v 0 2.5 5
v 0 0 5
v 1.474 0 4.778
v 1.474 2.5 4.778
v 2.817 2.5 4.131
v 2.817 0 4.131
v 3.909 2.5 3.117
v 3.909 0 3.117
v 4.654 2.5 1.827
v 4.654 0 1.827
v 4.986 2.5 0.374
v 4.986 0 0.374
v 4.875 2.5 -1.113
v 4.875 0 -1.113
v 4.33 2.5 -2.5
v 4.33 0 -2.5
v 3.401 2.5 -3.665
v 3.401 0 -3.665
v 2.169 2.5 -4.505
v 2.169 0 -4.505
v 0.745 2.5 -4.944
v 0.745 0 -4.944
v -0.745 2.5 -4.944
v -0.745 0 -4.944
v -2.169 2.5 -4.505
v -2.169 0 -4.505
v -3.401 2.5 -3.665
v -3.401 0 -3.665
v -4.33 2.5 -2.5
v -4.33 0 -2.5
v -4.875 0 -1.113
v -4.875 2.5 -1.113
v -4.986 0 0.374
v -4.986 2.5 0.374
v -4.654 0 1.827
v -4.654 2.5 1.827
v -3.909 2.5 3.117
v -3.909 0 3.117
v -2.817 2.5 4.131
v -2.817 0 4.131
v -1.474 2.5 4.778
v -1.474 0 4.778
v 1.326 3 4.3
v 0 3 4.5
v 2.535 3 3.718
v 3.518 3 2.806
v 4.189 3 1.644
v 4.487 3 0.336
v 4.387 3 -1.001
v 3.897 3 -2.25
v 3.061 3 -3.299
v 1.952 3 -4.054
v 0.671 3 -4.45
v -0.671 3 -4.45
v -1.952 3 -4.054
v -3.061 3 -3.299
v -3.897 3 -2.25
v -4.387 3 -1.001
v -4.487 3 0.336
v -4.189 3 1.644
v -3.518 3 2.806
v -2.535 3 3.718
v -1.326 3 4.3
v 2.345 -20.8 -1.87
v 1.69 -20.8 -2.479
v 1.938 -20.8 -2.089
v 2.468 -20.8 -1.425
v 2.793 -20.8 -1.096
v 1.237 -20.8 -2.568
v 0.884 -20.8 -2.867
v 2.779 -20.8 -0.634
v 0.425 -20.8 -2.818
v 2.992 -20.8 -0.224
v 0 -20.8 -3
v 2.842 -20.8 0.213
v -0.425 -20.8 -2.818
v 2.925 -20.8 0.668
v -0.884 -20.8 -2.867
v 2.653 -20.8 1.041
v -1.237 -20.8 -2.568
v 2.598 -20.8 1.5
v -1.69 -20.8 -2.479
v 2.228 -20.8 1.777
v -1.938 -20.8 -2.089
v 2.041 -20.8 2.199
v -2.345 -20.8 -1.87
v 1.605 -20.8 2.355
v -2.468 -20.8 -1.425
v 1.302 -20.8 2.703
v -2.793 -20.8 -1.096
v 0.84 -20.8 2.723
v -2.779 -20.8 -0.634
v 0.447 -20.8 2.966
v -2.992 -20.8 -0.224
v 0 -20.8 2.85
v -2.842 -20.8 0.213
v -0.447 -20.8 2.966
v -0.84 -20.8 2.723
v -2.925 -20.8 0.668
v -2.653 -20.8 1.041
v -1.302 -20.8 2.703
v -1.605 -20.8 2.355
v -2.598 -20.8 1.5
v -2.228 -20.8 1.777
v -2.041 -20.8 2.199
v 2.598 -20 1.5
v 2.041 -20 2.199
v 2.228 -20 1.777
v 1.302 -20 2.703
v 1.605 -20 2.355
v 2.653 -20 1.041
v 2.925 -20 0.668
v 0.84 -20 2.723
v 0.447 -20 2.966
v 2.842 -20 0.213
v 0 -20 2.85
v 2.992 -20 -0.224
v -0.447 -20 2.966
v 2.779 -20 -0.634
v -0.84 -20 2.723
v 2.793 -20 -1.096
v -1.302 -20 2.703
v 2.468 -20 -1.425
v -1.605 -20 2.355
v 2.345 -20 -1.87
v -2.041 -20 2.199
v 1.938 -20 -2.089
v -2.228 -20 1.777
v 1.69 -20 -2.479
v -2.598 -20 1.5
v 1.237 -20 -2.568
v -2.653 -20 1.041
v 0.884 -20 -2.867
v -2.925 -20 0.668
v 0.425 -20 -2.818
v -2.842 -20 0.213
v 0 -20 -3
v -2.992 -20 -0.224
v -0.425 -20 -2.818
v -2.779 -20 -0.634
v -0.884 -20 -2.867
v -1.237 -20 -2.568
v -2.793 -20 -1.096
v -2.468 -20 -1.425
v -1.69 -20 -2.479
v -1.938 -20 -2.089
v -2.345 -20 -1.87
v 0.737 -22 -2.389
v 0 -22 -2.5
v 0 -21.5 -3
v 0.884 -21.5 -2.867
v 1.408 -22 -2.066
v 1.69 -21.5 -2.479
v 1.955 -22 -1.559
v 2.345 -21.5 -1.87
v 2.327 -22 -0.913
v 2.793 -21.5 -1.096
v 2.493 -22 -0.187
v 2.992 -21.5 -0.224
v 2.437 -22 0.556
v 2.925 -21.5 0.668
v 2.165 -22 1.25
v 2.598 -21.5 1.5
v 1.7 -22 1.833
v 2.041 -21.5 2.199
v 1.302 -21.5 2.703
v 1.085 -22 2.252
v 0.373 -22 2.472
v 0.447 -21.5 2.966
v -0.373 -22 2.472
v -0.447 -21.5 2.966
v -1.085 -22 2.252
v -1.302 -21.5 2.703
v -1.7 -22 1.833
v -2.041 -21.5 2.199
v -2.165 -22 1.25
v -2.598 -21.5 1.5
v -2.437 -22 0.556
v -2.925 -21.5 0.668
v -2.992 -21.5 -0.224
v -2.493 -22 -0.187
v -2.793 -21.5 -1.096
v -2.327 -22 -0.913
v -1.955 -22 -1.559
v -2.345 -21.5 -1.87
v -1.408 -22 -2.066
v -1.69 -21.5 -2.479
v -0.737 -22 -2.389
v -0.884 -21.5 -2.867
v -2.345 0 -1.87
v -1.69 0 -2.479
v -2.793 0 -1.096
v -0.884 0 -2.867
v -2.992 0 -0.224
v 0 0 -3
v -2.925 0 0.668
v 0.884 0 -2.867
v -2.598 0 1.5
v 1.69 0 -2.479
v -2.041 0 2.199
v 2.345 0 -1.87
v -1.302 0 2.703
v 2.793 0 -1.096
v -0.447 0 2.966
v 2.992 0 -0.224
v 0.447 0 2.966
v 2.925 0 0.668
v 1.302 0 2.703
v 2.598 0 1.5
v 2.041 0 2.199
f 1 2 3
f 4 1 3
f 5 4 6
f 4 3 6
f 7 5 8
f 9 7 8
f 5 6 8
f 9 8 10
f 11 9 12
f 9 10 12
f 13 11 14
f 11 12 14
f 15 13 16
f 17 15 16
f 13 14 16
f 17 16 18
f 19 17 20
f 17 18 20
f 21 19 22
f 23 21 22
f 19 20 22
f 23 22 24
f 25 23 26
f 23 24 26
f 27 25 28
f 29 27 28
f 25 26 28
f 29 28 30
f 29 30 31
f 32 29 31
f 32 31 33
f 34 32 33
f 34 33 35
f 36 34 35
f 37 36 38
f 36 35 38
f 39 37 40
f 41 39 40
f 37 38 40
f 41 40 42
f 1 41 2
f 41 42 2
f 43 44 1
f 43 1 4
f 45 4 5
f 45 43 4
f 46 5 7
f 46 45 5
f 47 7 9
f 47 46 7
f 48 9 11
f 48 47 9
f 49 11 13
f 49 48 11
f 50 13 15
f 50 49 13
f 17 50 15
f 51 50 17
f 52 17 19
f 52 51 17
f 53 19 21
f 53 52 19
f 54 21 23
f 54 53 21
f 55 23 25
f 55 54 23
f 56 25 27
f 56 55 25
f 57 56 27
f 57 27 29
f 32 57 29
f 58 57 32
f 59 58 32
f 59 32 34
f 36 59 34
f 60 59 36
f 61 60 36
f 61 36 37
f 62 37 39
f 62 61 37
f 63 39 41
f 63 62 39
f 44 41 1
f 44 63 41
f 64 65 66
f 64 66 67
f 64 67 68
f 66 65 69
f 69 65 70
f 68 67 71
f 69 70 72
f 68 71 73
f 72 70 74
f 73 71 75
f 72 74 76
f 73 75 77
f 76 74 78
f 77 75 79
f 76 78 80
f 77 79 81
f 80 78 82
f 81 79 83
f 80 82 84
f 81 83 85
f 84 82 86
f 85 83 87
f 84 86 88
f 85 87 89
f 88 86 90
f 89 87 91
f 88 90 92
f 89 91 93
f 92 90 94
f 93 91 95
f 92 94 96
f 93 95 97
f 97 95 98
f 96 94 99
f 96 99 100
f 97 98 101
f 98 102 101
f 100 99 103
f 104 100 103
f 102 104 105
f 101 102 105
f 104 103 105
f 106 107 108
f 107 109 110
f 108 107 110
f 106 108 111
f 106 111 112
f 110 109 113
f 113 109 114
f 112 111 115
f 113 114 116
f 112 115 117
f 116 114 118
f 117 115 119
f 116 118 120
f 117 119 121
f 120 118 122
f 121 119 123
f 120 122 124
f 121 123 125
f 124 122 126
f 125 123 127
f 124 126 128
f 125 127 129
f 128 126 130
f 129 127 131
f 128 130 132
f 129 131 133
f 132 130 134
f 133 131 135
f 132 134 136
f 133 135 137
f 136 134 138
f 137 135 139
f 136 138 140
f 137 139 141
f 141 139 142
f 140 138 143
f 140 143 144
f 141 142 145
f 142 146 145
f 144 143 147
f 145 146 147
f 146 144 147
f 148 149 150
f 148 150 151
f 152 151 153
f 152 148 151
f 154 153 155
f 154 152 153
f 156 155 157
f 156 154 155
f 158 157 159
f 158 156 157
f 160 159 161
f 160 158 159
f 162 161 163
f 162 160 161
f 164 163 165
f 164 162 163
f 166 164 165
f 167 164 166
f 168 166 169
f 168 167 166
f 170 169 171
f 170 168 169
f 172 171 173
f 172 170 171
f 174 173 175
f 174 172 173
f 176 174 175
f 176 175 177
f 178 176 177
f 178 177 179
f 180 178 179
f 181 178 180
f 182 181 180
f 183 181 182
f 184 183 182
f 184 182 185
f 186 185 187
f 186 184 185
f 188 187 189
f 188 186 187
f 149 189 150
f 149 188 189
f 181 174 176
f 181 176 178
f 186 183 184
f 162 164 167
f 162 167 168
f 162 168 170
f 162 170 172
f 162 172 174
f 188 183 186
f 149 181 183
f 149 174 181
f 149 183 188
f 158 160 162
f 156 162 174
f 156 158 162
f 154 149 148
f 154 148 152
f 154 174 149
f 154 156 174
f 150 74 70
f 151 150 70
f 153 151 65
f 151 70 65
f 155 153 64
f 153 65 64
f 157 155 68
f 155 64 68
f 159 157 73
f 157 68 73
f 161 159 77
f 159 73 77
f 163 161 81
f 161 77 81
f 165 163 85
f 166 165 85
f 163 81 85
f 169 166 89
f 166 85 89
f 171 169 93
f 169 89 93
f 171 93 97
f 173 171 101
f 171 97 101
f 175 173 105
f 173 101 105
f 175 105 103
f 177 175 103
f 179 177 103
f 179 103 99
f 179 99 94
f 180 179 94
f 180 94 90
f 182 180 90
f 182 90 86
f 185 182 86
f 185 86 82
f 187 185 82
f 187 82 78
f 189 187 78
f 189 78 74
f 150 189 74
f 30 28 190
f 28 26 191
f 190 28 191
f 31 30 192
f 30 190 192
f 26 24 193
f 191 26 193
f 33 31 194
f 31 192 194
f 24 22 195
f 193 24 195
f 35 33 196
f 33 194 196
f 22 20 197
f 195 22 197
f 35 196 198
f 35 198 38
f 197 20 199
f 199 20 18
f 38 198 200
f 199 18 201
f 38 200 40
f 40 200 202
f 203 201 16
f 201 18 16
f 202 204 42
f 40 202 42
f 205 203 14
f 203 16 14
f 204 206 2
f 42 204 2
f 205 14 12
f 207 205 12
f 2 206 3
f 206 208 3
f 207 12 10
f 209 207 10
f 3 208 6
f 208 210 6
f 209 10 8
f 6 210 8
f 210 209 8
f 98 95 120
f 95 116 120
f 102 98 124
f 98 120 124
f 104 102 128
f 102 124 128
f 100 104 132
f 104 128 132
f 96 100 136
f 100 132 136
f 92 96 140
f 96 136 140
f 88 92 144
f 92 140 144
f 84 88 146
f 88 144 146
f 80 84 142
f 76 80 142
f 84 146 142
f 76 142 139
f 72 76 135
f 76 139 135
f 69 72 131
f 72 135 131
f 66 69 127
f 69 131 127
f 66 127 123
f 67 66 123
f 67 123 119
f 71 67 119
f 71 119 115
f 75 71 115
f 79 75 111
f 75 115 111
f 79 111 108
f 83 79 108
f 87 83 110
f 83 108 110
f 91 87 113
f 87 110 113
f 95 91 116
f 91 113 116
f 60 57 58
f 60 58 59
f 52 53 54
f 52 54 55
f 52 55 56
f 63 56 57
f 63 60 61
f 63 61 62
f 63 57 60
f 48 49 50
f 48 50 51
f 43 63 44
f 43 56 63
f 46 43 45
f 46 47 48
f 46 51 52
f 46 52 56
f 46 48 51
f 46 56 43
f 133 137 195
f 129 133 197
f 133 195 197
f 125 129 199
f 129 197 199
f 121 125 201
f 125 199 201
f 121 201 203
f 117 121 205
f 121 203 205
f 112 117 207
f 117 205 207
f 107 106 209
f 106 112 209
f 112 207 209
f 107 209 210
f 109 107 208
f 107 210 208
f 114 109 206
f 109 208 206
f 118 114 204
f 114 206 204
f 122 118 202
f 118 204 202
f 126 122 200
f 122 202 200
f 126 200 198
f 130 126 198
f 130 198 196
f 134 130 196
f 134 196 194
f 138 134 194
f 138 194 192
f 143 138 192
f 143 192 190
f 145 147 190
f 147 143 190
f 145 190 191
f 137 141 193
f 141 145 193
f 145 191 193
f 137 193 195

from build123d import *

# Parameters (mm, degrees)
SKETCH1_R           = 5
BOSS_EXTRUDE1_DEPTH = 3
CHAMFER1_SIZE       = 0.5
SKETCH2_R           = 3
BOSS_EXTRUDE2_DEPTH = 22
CHAMFER2_SIZE       = 0.5


with BuildPart() as part:
    # Sketch1 → Boss-Extrude1 (new body)
    with BuildSketch(Plane(origin=(0, 0, 0), x_dir=(-1, 0, 0), z_dir=(0, 1, 0))):
        with Locations(Location((0, 0, 0), (0, 0, 90))):
            Circle(SKETCH1_R)
    extrude(amount=BOSS_EXTRUDE1_DEPTH)

    # Chamfer1
    chamfer1_edges = [part.edges().sort_by_distance(p)[0] for p in [
        (0, 3, -5),
    ]]
    chamfer(chamfer1_edges, length=CHAMFER1_SIZE)

    # Sketch2 → Boss-Extrude2 (add)
    with BuildSketch(Plane.XZ):
        with Locations(Location((0, 0, 0), (0, 0, 270))):
            Circle(SKETCH2_R)
    extrude(amount=BOSS_EXTRUDE2_DEPTH)

    # Chamfer2
    chamfer2_edges = [part.edges().sort_by_distance(p)[0] for p in [
        (0, -22, 3),
    ]]
    chamfer(chamfer2_edges, length=CHAMFER2_SIZE)

    # Sketch3 → Cut-Revolve1 (revolve, cut)
    with BuildSketch(Plane.YZ):
        Polygon((-20.8, 3), (-20.8, 2.85), (-20, 2.85), (-20, 3), (-20, 3.35), (-20.8, 3.35), align=None)
    revolve(axis=Axis((0, 0, 0), (0, -1, 0)), mode=Mode.SUBTRACT)


solid = part.part
